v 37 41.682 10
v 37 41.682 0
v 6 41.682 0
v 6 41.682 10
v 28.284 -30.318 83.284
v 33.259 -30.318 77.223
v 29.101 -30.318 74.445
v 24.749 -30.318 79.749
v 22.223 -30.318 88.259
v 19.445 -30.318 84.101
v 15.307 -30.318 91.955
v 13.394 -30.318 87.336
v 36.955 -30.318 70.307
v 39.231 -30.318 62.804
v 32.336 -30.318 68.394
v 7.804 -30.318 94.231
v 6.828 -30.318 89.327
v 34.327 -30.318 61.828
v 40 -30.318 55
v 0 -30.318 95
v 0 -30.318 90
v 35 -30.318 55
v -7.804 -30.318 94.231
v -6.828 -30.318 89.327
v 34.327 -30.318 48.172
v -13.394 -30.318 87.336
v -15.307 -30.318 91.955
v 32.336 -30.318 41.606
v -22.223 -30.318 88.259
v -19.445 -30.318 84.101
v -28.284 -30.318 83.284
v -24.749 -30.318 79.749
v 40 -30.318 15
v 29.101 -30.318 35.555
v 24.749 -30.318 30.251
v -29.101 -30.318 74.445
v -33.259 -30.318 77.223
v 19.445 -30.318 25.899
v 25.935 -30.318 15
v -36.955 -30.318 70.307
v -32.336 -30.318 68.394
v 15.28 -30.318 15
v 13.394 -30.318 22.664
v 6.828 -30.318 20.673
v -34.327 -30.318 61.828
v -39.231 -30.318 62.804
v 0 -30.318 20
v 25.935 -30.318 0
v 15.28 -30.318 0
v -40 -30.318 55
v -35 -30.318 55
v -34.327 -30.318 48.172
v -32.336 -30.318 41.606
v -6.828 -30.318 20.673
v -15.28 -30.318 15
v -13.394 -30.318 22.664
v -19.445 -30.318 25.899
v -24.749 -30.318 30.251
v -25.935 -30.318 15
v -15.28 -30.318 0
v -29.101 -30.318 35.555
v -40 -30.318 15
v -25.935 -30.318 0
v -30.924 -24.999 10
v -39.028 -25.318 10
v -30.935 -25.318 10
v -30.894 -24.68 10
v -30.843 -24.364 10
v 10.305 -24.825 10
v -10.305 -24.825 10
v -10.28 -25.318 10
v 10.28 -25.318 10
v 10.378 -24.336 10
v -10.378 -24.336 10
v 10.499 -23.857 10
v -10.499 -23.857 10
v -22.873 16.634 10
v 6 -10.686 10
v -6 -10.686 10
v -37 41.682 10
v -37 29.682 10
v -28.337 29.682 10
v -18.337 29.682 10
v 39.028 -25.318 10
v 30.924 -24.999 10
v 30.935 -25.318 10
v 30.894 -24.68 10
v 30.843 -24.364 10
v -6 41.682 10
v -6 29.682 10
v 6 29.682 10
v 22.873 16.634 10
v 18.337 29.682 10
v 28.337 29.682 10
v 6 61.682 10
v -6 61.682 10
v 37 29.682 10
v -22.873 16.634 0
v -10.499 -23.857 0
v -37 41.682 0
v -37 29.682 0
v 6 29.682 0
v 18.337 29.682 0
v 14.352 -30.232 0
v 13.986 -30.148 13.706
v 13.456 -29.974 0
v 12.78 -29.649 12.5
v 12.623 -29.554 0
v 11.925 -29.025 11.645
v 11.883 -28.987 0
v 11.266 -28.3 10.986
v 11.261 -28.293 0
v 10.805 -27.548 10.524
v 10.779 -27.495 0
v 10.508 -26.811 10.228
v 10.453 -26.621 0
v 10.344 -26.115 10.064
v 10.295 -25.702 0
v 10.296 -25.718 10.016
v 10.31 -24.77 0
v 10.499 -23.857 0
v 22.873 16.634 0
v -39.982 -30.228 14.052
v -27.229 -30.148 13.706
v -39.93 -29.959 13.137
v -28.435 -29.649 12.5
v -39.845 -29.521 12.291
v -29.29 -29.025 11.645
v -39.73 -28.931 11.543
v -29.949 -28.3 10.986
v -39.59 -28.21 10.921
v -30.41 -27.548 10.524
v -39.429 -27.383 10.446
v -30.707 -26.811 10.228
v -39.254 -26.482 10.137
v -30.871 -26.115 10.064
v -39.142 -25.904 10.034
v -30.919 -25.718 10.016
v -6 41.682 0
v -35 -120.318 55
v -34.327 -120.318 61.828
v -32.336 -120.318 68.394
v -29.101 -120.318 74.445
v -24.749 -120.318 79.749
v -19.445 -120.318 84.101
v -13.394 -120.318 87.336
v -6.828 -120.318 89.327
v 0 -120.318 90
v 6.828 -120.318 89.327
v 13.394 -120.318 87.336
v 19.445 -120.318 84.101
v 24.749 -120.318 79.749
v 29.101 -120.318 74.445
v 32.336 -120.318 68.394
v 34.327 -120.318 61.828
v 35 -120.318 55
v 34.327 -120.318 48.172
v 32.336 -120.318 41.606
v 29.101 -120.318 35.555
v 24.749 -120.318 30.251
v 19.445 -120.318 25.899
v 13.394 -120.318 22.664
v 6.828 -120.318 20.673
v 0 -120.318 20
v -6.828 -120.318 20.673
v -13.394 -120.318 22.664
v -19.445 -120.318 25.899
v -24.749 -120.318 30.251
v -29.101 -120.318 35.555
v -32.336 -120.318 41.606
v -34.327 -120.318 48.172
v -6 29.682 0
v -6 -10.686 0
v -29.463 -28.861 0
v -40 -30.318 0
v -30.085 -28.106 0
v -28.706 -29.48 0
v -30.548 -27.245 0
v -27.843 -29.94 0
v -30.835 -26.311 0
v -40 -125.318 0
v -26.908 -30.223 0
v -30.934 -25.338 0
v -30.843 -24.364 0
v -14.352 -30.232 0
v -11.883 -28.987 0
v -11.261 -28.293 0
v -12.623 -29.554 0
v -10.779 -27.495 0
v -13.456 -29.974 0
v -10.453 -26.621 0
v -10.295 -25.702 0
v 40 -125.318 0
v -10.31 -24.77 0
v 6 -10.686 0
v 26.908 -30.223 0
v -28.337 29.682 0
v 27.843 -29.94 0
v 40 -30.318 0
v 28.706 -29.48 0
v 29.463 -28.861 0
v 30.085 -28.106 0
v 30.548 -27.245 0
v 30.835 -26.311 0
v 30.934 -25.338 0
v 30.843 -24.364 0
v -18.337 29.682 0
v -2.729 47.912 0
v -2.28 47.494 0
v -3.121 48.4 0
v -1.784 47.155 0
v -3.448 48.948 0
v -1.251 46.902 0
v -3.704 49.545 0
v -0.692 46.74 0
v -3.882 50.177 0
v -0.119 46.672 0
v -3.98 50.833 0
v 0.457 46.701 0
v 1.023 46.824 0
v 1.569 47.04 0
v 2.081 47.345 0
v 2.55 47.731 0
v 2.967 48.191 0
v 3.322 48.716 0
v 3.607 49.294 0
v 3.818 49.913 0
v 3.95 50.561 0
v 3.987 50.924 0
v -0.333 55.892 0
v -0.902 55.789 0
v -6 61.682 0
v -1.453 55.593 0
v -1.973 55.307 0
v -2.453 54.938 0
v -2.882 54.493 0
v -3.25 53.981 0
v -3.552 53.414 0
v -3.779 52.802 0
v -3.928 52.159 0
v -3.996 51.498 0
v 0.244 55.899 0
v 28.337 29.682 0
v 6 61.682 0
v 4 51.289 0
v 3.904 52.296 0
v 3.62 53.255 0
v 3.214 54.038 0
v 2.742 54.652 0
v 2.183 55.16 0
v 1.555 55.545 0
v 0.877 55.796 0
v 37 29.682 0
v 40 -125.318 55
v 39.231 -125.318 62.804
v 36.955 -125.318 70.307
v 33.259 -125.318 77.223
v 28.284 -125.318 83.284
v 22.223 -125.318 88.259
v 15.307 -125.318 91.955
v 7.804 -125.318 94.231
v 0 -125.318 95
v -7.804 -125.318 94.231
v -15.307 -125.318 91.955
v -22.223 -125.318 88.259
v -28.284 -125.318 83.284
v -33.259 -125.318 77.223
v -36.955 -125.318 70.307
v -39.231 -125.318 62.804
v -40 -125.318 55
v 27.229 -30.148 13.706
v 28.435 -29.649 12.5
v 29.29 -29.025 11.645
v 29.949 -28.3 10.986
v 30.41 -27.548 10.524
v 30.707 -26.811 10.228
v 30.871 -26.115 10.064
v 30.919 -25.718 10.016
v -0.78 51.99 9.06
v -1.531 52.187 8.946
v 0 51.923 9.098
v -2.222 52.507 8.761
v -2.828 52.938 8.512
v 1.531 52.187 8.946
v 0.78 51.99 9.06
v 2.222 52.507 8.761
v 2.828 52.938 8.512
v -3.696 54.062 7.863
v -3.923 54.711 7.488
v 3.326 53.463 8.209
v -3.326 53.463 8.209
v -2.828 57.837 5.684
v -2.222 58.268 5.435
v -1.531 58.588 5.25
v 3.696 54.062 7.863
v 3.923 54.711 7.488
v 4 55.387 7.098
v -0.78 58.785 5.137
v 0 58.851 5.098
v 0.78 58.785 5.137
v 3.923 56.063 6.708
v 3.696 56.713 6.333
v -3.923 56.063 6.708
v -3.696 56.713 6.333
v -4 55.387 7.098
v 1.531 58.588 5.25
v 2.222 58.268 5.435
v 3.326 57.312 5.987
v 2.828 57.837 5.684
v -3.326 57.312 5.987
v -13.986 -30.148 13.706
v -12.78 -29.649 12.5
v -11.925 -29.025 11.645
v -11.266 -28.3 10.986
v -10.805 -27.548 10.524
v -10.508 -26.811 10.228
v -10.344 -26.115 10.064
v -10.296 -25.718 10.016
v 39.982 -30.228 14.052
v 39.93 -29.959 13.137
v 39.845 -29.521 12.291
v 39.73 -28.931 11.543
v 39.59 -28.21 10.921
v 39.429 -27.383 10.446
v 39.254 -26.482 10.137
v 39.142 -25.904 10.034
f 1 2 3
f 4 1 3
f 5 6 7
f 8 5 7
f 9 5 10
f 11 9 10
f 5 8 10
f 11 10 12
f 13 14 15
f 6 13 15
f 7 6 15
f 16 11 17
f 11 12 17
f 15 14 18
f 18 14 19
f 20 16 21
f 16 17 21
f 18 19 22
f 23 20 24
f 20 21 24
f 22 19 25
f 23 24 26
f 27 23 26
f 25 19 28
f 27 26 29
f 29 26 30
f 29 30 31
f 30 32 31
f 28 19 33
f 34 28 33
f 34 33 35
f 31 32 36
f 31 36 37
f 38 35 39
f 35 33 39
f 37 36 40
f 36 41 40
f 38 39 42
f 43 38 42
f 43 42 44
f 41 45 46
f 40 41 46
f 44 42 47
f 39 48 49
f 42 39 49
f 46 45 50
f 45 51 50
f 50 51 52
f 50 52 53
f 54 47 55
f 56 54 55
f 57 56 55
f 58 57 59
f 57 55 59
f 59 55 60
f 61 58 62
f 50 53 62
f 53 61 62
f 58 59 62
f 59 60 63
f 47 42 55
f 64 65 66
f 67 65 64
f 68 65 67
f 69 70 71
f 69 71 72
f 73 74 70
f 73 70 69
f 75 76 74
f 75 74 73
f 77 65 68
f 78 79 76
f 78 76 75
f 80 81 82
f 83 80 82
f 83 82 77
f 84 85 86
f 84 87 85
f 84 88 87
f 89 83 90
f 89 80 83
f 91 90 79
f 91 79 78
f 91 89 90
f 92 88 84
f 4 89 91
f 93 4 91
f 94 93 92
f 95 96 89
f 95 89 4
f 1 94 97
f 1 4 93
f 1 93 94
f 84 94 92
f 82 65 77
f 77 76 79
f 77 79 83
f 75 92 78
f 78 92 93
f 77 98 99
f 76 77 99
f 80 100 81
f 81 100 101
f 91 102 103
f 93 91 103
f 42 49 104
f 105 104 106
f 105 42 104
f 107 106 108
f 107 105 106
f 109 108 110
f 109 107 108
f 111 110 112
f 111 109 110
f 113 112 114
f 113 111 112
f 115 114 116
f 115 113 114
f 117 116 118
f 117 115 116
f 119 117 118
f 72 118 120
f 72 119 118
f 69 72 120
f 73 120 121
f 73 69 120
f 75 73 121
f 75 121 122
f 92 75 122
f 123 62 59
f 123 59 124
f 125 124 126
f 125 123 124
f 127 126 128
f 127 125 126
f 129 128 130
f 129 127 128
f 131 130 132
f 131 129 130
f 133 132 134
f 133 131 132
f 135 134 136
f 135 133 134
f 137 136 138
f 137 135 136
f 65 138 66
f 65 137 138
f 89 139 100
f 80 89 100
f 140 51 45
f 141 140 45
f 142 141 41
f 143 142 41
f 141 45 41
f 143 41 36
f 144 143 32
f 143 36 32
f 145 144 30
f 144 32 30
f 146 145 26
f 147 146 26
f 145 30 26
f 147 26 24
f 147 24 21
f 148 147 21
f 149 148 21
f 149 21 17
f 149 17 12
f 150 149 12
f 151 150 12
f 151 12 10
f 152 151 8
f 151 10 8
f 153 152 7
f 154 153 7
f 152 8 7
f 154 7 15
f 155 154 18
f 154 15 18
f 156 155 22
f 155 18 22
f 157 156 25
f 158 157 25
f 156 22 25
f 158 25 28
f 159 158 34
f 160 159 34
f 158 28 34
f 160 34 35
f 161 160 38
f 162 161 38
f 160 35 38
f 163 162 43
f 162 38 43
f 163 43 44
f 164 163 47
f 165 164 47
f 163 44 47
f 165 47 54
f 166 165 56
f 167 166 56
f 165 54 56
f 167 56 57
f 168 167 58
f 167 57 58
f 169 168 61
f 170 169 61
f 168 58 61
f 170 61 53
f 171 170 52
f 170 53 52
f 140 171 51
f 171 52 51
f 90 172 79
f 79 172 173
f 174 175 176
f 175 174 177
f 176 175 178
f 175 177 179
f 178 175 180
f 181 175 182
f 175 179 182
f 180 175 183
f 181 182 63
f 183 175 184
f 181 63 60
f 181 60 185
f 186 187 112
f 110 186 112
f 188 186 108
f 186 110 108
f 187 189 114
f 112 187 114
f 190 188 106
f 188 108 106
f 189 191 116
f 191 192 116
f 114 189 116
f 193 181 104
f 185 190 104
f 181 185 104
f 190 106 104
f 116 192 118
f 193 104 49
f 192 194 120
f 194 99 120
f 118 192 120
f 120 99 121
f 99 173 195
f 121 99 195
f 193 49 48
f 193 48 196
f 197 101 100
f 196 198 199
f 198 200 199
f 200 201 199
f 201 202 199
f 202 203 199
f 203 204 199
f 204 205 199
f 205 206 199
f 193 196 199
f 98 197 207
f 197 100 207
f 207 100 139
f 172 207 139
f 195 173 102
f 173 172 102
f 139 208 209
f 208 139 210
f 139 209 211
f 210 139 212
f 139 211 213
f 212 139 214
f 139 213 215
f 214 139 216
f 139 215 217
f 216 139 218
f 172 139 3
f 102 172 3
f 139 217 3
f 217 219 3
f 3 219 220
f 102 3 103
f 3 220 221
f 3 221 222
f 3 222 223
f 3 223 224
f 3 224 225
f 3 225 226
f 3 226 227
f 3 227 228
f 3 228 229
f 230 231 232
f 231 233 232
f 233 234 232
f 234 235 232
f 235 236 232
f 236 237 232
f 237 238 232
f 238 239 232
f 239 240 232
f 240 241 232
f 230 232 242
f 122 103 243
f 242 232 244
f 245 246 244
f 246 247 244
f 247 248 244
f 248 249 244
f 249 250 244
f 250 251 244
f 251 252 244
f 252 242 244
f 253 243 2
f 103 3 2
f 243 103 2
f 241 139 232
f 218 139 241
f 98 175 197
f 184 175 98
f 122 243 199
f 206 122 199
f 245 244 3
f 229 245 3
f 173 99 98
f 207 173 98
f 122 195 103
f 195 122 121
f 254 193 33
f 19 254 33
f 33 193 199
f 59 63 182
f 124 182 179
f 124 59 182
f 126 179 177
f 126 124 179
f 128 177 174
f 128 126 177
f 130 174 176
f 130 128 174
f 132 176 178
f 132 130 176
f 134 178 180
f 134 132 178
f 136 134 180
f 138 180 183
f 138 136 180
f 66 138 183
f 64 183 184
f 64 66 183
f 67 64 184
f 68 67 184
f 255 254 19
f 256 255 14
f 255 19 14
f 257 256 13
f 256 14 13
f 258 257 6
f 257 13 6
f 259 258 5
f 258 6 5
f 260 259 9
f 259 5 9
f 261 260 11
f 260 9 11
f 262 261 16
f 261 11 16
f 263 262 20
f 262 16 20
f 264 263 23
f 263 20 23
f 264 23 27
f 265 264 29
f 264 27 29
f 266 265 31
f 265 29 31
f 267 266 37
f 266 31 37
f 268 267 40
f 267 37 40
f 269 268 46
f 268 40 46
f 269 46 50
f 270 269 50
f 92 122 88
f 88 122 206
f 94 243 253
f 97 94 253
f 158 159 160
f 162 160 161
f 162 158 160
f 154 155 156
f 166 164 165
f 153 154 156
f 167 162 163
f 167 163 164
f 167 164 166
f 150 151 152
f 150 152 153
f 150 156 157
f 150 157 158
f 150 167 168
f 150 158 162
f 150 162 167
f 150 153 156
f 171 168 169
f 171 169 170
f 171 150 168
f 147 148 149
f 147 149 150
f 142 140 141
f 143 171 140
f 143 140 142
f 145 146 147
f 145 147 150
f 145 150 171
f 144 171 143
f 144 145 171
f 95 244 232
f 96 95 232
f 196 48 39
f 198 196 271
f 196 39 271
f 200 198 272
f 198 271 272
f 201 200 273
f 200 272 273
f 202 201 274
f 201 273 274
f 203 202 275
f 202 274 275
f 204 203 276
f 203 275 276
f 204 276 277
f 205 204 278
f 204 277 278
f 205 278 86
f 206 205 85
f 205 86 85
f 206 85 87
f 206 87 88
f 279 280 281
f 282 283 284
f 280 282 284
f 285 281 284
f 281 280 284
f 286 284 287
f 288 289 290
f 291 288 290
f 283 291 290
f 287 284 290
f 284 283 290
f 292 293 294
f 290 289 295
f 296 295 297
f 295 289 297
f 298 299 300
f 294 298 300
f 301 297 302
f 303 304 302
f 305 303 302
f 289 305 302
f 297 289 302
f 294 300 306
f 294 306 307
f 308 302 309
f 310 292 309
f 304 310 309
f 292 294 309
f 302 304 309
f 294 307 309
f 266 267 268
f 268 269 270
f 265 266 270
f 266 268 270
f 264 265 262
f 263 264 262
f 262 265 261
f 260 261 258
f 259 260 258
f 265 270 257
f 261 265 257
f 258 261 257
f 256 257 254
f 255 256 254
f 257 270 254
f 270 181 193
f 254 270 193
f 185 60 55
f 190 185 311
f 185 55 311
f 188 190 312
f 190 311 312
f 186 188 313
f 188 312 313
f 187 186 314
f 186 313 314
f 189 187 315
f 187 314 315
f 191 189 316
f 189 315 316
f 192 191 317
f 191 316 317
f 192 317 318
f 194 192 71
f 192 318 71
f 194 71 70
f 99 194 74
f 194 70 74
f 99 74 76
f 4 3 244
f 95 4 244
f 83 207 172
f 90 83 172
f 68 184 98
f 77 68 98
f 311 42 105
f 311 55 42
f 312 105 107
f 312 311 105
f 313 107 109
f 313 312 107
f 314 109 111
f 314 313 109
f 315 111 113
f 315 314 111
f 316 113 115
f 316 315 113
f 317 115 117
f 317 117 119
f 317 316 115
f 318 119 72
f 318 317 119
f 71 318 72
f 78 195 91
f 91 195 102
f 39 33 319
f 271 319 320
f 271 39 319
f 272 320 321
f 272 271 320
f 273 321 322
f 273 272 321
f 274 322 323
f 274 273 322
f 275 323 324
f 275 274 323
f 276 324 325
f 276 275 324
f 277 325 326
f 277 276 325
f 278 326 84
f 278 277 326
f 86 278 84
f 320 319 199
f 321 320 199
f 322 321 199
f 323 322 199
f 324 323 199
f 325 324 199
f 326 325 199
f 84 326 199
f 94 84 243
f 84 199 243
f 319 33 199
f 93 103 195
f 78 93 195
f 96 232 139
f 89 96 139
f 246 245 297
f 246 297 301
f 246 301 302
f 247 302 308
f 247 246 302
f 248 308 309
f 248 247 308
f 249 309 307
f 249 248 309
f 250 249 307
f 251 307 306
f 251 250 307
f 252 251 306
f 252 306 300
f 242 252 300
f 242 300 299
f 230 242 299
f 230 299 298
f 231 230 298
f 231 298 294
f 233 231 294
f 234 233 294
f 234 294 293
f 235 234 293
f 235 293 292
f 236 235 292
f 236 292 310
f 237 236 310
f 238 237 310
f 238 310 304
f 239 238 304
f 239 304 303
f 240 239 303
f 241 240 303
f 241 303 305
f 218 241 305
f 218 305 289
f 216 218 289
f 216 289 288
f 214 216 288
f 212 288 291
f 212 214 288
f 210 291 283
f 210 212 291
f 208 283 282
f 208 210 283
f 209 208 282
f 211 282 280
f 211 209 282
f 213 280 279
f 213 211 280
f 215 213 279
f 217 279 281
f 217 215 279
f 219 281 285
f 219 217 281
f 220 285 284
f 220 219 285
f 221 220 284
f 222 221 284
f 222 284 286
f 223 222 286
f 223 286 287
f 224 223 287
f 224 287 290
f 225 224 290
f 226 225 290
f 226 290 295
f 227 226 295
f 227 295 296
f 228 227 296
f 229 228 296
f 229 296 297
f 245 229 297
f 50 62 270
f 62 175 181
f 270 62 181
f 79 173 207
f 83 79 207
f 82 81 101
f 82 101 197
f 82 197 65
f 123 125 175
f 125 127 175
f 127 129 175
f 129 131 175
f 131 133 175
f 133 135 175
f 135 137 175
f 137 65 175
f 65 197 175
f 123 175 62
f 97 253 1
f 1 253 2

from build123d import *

# Parameters (mm, degrees)
F1_DEPTH  = 10
F3_DEPTH  = 100
F4_R      = 35
F5_DEPTH  = 90
F6_DEPTH  = 95.001
F7_R      = 5
F10_R     = 4
F11_DEPTH = 18


with BuildPart() as f1:
    # F0 (on Top) → F1 (new body)
    with BuildSketch(Plane.XY):
        Polygon((-6, 61.6815258077), (-6, 41.6815258077), (-37, 41.6815258077), (-37, 29.6815258077), (-28.3371814517, 29.6815258077), (-40, -30.3184741923), (-40, -125.3184741923), (0, -125.3184741923), (40, -125.3184741923), (40, -30.3184741923), (28.3371814517, 29.6815258077), (37, 29.6815258077), (37, 41.6815258077), (6, 41.6815258077), (6, 61.6815258077), (0, 61.6815258077), align=None)
        Polygon((-8.5239209836, -30.3184741923), (-32, -30.3184741923), (-22.8734250069, 16.6336838404), align=None, mode=Mode.SUBTRACT)
        Polygon((-18.3371814517, 29.6815258077), (-6, 29.6815258077), (-6, -10.686231312), align=None, mode=Mode.SUBTRACT)
        Polygon((6, -10.686231312), (6, 29.6815258077), (18.3371814517, 29.6815258077), align=None, mode=Mode.SUBTRACT)
        Polygon((22.8734250069, 16.6336838404), (32, -30.3184741923), (8.5239209836, -30.3184741923), align=None, mode=Mode.SUBTRACT)
    extrude(amount=F1_DEPTH)

    # F2 (on face) → F3 (join)
    with BuildSketch(Plane.XY.offset(10)):
        Polygon((-8.5239209836, -30.3184741923), (-40, -30.3184741923), (-40, -125.3184741923), (40, -125.3184741923), (40, -30.3184741923), (8.5239209836, -30.3184741923), align=None)
    extrude(amount=F3_DEPTH)

    # F4 (on face) → F5 (cut)
    with BuildSketch(Plane(origin=(0, -30.3184741923, 0), x_dir=(-1, 0, 0), z_dir=(0, 1, 0))):
        with Locations((0, 55)):
            Circle(F4_R)
    extrude(amount=-F5_DEPTH, mode=Mode.SUBTRACT)

    # F4 (on face) → F6 (cut, through all)
    with BuildSketch(Plane(origin=(0, -30.3184741923, 0), x_dir=(-1, 0, 0), z_dir=(0, 1, 0))):
        with BuildLine():
            ThreePointArc((-40, 55), (0, 95), (40, 55))
            Line((40, 55), (40, 110))
            Line((40, 110), (-40, 110))
            Line((-40, 110), (-40, 55))
        make_face()
    extrude(amount=-F6_DEPTH, mode=Mode.SUBTRACT)

    # F7
    f7_edges = [f1.edges().sort_by_distance(p)[0] for p in [
        (0, -30.318474, 10),
        (-8.523921, -30.318474, 5),
        (8.523921, -30.318474, 5),
        (36, -30.318474, 10),
        (32, -30.318474, 5),
        (-36, -30.318474, 10),
        (-32, -30.318474, 5),
    ]]
    fillet(f7_edges, radius=F7_R)

    # F10 (on face) → F11 (cut)
    with BuildSketch(Plane(origin=(0, 7.9203814519, 13.7185030901), x_dir=(1, 0, 0), z_dir=(0, 0.5, 0.8660254038))):
        with Locations((0, 44.4177682936)):
            Circle(F10_R)
    extrude(amount=F11_DEPTH, mode=Mode.SUBTRACT)


solid = f1.part
